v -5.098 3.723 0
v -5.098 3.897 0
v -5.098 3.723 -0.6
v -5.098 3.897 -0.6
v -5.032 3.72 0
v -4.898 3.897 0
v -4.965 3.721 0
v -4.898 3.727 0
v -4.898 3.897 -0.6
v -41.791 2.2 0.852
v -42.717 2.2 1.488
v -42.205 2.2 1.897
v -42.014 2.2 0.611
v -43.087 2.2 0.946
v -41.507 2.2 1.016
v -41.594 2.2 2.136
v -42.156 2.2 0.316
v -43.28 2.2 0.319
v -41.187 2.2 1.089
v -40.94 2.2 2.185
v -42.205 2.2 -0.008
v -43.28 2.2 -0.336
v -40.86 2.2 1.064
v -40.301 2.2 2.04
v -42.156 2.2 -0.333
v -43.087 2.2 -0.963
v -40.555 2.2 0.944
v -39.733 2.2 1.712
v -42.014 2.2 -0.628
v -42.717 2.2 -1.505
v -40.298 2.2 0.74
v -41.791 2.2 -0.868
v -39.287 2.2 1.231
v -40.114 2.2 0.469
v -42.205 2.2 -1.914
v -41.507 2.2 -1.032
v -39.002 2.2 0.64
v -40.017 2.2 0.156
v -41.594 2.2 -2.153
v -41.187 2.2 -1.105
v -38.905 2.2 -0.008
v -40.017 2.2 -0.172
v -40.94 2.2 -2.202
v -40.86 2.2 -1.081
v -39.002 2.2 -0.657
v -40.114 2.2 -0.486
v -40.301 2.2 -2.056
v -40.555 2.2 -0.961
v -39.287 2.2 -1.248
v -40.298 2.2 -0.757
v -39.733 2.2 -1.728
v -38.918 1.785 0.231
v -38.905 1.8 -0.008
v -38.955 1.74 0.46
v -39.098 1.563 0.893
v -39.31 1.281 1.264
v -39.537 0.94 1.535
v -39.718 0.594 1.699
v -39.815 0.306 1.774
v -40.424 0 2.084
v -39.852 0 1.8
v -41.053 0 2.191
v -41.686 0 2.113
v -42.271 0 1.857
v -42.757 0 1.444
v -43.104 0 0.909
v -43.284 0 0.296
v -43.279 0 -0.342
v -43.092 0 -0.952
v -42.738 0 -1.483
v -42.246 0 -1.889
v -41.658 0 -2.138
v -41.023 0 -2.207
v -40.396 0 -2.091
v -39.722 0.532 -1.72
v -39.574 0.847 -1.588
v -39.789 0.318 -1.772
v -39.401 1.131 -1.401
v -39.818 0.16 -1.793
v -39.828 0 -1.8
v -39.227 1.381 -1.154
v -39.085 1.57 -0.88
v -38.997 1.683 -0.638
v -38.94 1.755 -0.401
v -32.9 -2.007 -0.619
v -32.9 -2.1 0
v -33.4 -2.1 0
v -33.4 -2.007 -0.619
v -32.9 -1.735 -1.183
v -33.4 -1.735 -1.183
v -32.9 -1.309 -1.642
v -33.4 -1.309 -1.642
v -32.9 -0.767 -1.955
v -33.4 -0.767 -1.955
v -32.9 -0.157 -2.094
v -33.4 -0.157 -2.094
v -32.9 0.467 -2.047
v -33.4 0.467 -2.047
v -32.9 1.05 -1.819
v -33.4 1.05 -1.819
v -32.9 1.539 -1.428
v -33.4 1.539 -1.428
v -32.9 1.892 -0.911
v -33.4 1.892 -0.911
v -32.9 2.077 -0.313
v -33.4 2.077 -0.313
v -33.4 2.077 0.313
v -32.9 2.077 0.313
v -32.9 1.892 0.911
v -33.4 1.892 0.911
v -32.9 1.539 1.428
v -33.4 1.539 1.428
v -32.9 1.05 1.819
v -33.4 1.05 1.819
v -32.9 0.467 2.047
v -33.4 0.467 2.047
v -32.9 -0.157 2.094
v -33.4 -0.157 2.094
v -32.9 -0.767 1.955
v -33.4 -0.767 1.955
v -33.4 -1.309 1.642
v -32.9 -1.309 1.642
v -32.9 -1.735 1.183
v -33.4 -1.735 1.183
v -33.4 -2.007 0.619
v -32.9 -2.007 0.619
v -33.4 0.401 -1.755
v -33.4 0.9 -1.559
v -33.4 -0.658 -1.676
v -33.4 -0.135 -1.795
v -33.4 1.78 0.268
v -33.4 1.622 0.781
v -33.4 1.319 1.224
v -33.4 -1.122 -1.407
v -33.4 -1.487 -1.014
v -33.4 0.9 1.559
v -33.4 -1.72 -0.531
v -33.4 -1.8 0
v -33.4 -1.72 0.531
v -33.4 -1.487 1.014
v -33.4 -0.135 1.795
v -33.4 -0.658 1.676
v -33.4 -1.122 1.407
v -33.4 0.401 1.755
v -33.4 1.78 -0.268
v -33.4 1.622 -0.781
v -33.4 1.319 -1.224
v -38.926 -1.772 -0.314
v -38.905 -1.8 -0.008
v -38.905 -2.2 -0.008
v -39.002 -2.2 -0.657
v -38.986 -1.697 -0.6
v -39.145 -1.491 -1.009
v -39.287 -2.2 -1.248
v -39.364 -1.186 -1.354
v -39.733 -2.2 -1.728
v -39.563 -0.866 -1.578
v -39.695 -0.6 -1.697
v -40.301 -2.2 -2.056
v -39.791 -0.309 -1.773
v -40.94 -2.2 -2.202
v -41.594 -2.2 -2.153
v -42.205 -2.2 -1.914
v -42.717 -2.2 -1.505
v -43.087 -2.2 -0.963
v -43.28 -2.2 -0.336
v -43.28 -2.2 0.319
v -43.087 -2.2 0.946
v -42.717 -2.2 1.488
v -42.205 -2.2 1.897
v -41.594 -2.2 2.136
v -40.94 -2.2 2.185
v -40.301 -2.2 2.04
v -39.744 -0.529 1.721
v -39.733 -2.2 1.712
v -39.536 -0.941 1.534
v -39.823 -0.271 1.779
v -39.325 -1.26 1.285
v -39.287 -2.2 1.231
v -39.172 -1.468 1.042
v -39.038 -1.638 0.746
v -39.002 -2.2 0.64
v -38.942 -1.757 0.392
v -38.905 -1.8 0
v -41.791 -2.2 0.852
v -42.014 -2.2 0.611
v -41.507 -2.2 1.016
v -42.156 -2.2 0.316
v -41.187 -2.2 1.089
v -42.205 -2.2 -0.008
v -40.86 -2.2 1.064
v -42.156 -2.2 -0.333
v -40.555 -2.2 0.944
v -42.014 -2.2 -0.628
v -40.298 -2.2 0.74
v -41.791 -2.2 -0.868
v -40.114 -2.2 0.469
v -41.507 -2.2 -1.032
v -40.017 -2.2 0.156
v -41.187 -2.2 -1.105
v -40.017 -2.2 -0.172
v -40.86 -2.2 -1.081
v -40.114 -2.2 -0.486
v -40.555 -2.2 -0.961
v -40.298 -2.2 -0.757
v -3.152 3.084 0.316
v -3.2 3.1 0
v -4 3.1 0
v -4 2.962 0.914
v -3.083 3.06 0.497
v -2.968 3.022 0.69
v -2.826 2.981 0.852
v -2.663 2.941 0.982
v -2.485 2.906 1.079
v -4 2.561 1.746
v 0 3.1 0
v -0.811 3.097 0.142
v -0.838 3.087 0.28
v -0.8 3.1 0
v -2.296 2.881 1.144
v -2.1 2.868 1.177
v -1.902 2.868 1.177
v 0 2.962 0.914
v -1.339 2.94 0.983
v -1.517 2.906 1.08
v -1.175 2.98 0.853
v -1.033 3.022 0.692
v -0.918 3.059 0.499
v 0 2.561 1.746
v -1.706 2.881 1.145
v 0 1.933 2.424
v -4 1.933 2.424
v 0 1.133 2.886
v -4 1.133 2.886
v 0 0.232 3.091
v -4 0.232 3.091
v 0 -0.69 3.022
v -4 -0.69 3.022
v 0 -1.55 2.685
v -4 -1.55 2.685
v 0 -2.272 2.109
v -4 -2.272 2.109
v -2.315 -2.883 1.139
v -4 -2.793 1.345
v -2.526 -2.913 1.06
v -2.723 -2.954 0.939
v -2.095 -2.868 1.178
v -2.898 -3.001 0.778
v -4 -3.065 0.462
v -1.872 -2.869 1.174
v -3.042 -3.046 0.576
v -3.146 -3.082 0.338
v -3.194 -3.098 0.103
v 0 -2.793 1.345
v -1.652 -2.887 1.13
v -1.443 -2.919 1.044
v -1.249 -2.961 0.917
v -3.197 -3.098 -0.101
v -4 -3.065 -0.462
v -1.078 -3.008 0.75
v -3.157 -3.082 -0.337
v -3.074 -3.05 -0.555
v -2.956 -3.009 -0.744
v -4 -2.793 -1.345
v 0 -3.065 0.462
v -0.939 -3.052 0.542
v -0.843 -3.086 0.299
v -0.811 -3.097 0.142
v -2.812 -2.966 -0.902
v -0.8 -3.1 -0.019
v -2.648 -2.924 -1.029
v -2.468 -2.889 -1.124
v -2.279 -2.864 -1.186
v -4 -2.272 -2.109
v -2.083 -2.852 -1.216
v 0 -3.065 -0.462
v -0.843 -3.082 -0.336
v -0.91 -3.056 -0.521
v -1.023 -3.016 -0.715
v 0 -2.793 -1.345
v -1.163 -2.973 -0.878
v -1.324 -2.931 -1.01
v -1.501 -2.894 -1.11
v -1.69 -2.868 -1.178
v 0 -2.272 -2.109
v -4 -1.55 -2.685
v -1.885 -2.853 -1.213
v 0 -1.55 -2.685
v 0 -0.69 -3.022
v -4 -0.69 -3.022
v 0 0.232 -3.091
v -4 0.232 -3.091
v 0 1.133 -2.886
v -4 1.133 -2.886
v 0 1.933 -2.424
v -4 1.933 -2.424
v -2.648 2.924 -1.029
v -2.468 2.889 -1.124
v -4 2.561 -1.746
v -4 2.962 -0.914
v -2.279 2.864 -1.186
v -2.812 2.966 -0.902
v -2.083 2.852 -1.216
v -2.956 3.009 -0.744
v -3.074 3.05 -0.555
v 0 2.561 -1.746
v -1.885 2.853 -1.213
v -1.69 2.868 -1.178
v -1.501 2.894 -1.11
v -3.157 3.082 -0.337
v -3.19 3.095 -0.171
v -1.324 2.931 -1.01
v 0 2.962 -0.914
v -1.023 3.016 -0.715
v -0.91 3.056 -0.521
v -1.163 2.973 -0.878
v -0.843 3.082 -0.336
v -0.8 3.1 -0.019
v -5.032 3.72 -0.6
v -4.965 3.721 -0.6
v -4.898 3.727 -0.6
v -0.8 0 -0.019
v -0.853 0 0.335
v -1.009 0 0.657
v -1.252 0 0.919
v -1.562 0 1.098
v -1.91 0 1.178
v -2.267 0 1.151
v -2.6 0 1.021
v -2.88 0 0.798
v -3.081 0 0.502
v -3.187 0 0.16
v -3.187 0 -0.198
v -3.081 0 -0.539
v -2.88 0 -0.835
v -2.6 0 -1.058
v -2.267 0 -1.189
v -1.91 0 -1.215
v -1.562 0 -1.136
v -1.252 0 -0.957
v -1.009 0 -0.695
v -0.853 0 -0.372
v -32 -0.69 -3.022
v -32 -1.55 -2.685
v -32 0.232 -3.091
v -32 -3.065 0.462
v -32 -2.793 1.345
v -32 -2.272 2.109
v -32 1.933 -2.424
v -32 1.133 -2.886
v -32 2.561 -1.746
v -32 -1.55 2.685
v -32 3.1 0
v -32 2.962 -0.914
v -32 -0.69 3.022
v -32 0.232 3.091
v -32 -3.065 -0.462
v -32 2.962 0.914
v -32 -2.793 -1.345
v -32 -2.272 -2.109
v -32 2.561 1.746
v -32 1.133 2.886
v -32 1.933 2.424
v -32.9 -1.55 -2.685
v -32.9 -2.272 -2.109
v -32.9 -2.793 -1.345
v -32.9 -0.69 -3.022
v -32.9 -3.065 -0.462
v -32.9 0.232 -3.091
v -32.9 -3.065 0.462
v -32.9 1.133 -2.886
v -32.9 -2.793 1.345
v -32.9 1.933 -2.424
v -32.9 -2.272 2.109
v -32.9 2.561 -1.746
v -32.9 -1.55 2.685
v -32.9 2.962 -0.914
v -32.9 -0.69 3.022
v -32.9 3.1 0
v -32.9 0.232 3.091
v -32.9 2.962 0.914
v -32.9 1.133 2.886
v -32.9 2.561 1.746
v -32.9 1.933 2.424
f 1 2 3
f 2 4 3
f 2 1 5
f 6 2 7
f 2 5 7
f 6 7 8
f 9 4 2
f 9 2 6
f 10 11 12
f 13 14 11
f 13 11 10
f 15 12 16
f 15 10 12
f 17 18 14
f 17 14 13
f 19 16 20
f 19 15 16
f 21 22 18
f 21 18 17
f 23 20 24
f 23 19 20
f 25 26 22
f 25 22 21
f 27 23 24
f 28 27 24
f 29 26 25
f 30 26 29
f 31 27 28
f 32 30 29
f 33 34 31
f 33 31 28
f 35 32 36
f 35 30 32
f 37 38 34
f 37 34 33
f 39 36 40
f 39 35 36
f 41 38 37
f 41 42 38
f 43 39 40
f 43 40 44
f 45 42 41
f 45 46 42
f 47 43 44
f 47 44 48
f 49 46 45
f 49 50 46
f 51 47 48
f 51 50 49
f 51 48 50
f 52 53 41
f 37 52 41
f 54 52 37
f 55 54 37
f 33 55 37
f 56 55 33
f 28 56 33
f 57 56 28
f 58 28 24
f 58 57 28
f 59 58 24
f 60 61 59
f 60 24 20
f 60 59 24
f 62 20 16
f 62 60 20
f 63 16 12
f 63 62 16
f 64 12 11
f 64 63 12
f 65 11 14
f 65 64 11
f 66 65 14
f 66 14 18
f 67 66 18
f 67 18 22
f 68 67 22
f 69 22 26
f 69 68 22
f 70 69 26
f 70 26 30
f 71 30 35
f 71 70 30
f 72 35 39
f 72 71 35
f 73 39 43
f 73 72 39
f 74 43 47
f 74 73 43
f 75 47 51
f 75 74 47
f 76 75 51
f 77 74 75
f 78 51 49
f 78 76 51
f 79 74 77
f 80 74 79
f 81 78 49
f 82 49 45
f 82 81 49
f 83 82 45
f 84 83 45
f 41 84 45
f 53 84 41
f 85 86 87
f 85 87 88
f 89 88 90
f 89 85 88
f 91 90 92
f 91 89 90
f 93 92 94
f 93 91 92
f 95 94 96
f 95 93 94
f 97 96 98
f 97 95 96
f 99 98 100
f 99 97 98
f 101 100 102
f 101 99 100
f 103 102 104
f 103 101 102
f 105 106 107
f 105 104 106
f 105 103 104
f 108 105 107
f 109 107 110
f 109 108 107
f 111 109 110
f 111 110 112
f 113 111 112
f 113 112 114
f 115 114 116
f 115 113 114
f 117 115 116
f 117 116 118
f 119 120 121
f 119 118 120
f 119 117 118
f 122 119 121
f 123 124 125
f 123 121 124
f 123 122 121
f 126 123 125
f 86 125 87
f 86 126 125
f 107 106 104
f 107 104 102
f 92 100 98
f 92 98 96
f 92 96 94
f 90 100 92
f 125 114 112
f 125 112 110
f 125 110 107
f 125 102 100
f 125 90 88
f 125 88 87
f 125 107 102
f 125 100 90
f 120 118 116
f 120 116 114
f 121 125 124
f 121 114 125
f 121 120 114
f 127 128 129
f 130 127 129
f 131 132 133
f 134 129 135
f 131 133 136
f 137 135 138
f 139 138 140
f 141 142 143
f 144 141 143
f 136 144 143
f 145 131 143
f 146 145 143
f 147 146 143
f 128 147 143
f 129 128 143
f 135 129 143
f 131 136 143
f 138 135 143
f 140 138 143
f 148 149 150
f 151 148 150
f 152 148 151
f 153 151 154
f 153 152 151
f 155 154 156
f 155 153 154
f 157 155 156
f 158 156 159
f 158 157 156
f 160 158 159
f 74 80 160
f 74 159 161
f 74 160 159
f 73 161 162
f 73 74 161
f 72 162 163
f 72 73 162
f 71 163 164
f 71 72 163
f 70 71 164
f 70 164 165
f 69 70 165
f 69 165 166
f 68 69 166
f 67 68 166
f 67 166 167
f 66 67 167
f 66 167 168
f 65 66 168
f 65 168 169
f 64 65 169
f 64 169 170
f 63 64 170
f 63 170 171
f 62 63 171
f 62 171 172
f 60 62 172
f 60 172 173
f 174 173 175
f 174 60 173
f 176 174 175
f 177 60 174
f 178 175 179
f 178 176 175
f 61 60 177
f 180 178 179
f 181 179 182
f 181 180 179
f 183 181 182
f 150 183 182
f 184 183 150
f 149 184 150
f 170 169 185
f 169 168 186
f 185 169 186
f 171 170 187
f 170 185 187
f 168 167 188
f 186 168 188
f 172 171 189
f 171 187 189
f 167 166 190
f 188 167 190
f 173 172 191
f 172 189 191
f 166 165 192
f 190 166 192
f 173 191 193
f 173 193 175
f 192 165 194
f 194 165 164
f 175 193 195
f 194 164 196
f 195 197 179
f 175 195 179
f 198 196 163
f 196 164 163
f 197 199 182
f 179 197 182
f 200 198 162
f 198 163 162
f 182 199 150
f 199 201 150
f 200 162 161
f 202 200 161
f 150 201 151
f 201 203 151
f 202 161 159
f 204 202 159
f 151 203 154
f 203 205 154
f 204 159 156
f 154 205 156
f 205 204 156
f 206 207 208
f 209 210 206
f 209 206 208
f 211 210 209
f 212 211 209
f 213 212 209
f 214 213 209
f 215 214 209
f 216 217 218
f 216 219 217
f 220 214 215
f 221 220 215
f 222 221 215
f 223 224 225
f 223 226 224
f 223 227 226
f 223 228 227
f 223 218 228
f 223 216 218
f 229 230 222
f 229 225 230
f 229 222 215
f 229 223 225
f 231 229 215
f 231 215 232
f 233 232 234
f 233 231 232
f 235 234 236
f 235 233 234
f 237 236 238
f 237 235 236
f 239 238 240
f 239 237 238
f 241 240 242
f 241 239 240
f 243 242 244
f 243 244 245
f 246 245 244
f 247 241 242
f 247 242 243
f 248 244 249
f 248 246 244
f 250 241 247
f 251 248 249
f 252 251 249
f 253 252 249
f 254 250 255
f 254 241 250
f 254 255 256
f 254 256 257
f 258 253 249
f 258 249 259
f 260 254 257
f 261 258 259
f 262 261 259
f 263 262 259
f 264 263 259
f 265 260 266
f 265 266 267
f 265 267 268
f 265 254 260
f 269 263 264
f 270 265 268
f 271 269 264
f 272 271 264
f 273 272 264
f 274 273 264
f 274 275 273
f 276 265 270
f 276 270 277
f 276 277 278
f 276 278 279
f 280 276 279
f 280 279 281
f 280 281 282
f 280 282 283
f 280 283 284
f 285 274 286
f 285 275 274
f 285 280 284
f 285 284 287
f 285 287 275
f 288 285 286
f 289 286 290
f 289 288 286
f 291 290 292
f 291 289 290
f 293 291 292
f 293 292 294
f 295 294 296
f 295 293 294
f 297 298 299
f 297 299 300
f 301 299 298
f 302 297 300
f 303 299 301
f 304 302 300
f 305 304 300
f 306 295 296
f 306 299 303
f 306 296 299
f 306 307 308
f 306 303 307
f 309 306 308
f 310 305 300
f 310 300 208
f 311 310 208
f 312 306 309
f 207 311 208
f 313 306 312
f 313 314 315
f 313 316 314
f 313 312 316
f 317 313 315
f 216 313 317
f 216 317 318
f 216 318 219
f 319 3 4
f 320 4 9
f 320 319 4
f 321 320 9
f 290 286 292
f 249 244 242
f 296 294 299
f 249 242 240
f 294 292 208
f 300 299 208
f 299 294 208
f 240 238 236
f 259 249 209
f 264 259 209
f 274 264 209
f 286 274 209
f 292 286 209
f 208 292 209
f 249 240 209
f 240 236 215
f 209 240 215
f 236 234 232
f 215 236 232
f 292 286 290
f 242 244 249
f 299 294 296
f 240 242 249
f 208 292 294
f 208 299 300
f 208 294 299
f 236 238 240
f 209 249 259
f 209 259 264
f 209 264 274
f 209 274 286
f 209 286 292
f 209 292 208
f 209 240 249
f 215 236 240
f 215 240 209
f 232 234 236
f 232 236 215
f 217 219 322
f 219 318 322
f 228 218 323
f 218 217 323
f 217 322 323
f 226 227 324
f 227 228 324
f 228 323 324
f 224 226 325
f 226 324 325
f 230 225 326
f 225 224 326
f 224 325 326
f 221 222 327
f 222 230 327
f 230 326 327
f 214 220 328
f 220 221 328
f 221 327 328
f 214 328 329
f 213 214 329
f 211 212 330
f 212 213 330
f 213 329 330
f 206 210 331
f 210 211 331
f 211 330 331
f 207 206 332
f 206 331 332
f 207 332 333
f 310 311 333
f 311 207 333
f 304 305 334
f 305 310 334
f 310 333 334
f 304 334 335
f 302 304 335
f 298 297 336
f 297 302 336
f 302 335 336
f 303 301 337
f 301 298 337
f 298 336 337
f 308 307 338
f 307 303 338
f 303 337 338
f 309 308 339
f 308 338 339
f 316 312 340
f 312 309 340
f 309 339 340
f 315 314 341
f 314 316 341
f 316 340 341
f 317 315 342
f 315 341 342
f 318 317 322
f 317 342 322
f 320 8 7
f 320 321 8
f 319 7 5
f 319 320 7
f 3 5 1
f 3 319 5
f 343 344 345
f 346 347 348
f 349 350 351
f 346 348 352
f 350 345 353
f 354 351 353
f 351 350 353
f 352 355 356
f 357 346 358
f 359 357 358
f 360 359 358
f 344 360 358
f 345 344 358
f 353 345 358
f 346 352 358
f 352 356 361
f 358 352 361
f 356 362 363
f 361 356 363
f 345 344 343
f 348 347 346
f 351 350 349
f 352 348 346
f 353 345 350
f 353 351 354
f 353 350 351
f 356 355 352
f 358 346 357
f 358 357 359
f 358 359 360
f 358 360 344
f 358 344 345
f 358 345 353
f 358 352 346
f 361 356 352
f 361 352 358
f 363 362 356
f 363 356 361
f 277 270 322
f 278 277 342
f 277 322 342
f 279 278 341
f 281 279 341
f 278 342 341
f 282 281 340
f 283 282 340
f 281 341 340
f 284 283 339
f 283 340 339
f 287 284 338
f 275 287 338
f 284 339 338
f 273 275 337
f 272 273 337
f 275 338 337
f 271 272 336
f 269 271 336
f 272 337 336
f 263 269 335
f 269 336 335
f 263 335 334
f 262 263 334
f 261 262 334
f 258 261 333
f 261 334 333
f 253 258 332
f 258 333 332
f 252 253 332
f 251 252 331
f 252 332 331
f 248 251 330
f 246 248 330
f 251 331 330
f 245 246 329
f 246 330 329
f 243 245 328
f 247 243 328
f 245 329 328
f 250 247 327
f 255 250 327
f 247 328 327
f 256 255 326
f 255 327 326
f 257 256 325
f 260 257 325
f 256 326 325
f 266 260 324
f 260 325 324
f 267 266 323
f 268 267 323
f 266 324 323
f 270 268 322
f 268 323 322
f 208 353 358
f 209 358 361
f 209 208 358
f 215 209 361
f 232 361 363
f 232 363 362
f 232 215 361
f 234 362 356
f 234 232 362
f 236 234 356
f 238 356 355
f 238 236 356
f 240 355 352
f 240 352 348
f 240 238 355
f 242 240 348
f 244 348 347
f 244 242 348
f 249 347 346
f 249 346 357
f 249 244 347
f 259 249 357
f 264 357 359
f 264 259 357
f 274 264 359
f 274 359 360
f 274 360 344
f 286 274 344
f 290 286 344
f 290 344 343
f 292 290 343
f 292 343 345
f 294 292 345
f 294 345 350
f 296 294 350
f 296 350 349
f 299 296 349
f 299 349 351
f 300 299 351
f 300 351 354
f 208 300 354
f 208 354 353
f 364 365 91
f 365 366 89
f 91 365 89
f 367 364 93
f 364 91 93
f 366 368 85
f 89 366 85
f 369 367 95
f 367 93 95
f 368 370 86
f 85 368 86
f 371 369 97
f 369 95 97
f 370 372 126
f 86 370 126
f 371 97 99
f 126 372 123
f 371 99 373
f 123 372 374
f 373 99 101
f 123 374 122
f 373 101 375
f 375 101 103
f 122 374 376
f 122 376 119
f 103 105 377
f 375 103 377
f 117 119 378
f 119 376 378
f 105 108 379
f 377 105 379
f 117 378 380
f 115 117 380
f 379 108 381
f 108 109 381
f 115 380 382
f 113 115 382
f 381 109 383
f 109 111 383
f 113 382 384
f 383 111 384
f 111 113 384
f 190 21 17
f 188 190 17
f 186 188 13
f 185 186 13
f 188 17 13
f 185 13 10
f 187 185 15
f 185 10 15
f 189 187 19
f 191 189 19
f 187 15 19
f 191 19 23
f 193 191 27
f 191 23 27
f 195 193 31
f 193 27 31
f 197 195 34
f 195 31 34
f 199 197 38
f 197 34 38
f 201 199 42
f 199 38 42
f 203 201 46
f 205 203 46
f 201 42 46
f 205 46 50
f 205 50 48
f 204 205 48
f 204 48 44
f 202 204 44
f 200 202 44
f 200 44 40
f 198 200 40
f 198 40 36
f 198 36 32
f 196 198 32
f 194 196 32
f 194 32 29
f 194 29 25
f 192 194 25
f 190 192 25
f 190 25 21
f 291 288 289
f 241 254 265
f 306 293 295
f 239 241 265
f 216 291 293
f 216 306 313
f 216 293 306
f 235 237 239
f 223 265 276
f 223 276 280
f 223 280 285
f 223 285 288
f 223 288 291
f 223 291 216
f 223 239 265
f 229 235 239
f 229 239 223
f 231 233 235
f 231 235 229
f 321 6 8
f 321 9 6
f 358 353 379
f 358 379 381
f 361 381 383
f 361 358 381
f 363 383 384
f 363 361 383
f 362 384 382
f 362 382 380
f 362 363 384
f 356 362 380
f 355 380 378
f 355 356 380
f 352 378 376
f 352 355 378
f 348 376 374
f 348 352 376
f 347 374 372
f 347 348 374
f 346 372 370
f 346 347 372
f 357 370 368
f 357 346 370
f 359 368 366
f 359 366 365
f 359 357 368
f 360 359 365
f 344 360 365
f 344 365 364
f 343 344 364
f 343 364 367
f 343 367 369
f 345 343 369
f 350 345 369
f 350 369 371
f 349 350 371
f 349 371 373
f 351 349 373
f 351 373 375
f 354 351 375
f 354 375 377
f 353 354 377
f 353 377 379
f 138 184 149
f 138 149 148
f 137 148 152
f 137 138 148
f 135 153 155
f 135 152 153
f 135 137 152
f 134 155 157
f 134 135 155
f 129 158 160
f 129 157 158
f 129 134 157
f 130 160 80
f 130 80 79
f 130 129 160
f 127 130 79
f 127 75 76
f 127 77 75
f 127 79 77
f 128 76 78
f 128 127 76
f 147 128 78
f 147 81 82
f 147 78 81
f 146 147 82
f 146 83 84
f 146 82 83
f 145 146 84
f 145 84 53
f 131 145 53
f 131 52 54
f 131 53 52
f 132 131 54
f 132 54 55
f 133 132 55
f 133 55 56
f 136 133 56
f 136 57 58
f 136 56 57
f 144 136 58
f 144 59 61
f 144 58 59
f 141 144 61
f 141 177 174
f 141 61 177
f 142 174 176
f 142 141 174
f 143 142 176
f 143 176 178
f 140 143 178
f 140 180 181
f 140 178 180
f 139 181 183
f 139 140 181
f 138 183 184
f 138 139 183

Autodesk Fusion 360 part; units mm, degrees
sketch "Sketch1" plane through (0, 0, 0) normal (1, 0, 0) x (0, 1, 0)
  circle A0 centre (0, 0) radius 3.1
  dimension "d1" = 6.2
extrude "Extrude1" add sketch "Sketch1" against normal blind 4 makes body 1
extrude "Extrude1'" add 1 faces at (-4, -0.4599, 1.4057) along direction (-1, 0, 0) blind 28 separate body on bodies 1 makes body 2 in component "Component"
extrude "Extrude1''" add 1 faces at (-32, -0.4599, 1.4057) along direction (-1, 0, 0) blind 0.9 separate body on bodies 2 makes body 3 in component "Component'"
sketch "Sketch2" plane through (-32.9, 0, 0) normal (-1, 0, 0) x (0, -1, 0)
  circle A0 centre (0, 0) radius 3.1
  circle A1 centre (0, 0) radius 2.1
  dimension "d8" = 4.2
extrude "Extrude2" add sketch "Sketch2" along normal blind 0.5 contours A1 bodies 3 in component "Component'"
sketch "Sketch3" plane through (-33.4, 0, 0) normal (-1, 0, 0) x (0, -1, 0)
  circle A0 centre (0, 0) radius 2.1
  circle A1 centre (0, 0) radius 1.8
  dimension "d11" = 3.6
extrude "Extrude2'" add sketch "Sketch3" along normal blind 7.7 separate body contours A1 makes body 4
sketch "Sketch4" plane through (0, 0, 0) normal (0, 1, 0) x (1, 0, 0)
  circle A0 centre (-41.1047, 0.0084) radius 2.2
  dimension "d14" = 4.4
extrude "Extrude3" add sketch "Sketch4" along normal mid plane 4.4 bodies 4
sketch "Sketch5" plane through (0, 2.2, 0) normal (0, 1, 0) x (-1, 0, 0)
  circle A0 centre (41.1047, -0.0084) radius 2.2
  circle A1 centre (41.1047, -0.0084) radius 1.1
  dimension "d17" = 2.2
extrude "Extrude4" cut sketch "Sketch5" against normal blind 5.607 contours A1 bodies 4
sketch "Sketch6" plane through (0, 0, 0) normal (0, 1, 0) x (1, 0, 0)
  circle A0 centre (-2, 0.0187) radius 1.2
  line L0 (0, -3.1) -> (0, 3.1)
  dimension "d20" = 2.4
  dimension "d21" = 2.4
  dimension "d22" = 2
extrude "Extrude5" cut sketch "Sketch6" along normal mid plane 13.01 bodies 1
sketch "Sketch7" plane through (0, 0, 0) normal (1, 0, 0) x (0, 1, 0)
sketch "Sketch8" plane through (0, 0, 0) normal (0, 0, 1) x (1, 0, 0)
  circle A0 centre (-5.0226, 4.9201) radius 1
  dimension "d25" = 2
sketch "Sketch9" plane through (0, 0, 0) normal (0, 0, -1) x (1, 0, 0)
  circle A0 centre (-5.0226, -4.9201) radius 1
  circle A1 centre (-5.0226, -4.9201) radius 0.8
  dimension "d28" = 1.6
sketch "Sketch10" plane through (0, 0, -0.6) normal (0, 0, -1) x (1, 0, 0)
  circle A0 centre (-5.0226, -4.9201) radius 0.8
  circle A1 centre (-5.0226, -4.9201) radius 0.6
  dimension "d31" = 1.2
sketch "Sketch11" plane through (0, 0, 0) normal (0, 0, -1) x (1, 0, 0)
  circle A0 centre (-5.0226, -4.9201) radius 0.8
  circle A1 centre (-5.0226, -4.9201) radius 1
  circle A2 centre (-5.0226, -4.9201) radius 1.2
  dimension "d34" = 2.4
sketch "Sketch12" plane through (0, 0, -0.6) normal (0, 0, -1) x (1, 0, 0)
  circle A0 centre (-5.0226, -4.9201) radius 1.2
  line L0 (-5.0985, -4.0295) -> (-5.0985, -3.6215)
  line L1 (-4.8985, -4.028) -> (-4.8985, -3.6403)
  line L2 (-4.9985, -4.9971) -> (-4.9985, -3.4779) construction
  line L3 (-5.1941, -3.8971) -> (-4.7341, -3.8971)
  circle A1 centre (-5.0226, -4.9201) radius 0.8
  dimension "d37" = 0.1
  dimension "d38" = 0.1
  dimension "d41" = 1.1
extrude "Extrude10" add sketch "Sketch12" against normal blind 0.6 separate body contours A0 L0 L1 L3 picked at (-4.9874, -3.8385) makes body 5
sketch "Sketch13" plane through (0, 0, -0.6) normal (0, 0, -1) x (1, 0, 0)
  line L0 (-4.8985, -3.8971) -> (-4.8985, -3.7265)
  arc A0 (-4.8985, -3.7265) -> (-5.0985, -3.7225) centre (-5.0226, -4.9201) ccw
  line L1 (-5.0985, -3.7225) -> (-5.0985, -3.8971)
  line L2 (-5.0985, -3.8971) -> (-4.8985, -3.8971)
  line L3 (-5.0226, -4.9201) -> (-4.9575, -5.4988)
  arc A1 (-5.3142, -3.7561) -> (-5.5035, -3.8207) centre (-5.0226, -4.9201) ccw
  line L4 (-5.2559, -3.9163) -> (-5.3142, -3.7561)
  line L5 (-5.4438, -3.9847) -> (-5.2559, -3.9163)
  line L6 (-5.5035, -3.8207) -> (-5.4438, -3.9847)
  arc A2 (-5.6948, -3.926) -> (-5.8506, -4.0515) centre (-5.0226, -4.9201) ccw
  line L7 (-5.5851, -4.0567) -> (-5.6948, -3.926)
  line L8 (-5.7383, -4.1852) -> (-5.5851, -4.0567)
  line L9 (-5.8506, -4.0515) -> (-5.7383, -4.1852)
  arc A3 (-5.9942, -4.2158) -> (-6.0977, -4.387) centre (-5.0226, -4.9201) ccw
  line L10 (-5.8465, -4.3011) -> (-5.9942, -4.2158)
  line L11 (-5.9465, -4.4743) -> (-5.8465, -4.3011)
  line L12 (-6.0977, -4.387) -> (-5.9465, -4.4743)
  arc A4 (-6.1765, -4.5906) -> (-6.2152, -4.7869) centre (-5.0226, -4.9201) ccw
  line L13 (-6.0085, -4.6202) -> (-6.1765, -4.5906)
  line L14 (-6.0433, -4.8172) -> (-6.0085, -4.6202)
  line L15 (-6.2152, -4.7869) -> (-6.0433, -4.8172)
  arc A5 (-6.2196, -5.0051) -> (-6.1888, -5.2028) centre (-5.0226, -4.9201) ccw
  line L16 (-6.0516, -4.9755) -> (-6.2196, -5.0051)
  line L17 (-6.0169, -5.1725) -> (-6.0516, -4.9755)
  line L18 (-6.1888, -5.2028) -> (-6.0169, -5.1725)
  arc A6 (-6.1183, -5.4094) -> (-6.0218, -5.5846) centre (-5.0226, -4.9201) ccw
  line L19 (-5.9706, -5.3241) -> (-6.1183, -5.4094)
  line L20 (-5.8706, -5.4973) -> (-5.9706, -5.3241)
  line L21 (-6.0218, -5.5846) -> (-5.8706, -5.4973)
  arc A7 (-5.8849, -5.7546) -> (-5.7343, -5.8863) centre (-5.0226, -4.9201) ccw
  line L22 (-5.7752, -5.624) -> (-5.8849, -5.7546)
  line L23 (-5.622, -5.7525) -> (-5.7752, -5.624)
  line L24 (-5.7343, -5.8863) -> (-5.622, -5.7525)
  arc A8 (-5.5474, -5.9992) -> (-5.3609, -6.0714) centre (-5.0226, -4.9201) ccw
  line L25 (-5.4891, -5.839) -> (-5.5474, -5.9992)
  line L26 (-5.3012, -5.9074) -> (-5.4891, -5.839)
  line L27 (-5.3609, -6.0714) -> (-5.3012, -5.9074)
  arc A9 (-5.1467, -6.1137) -> (-4.9467, -6.1177) centre (-5.0226, -4.9201) ccw
  line L28 (-5.1467, -5.9431) -> (-5.1467, -6.1137)
  line L29 (-4.9467, -5.9431) -> (-5.1467, -5.9431)
  line L30 (-4.9467, -6.1177) -> (-4.9467, -5.9431)
  arc A10 (-4.731, -6.0841) -> (-4.5417, -6.0195) centre (-5.0226, -4.9201) ccw
  line L31 (-4.7893, -5.9238) -> (-4.731, -6.0841)
  line L32 (-4.6014, -5.8554) -> (-4.7893, -5.9238)
  line L33 (-4.5417, -6.0195) -> (-4.6014, -5.8554)
  arc A11 (-4.3505, -5.9142) -> (-4.1947, -5.7887) centre (-5.0226, -4.9201) ccw
  line L34 (-4.4601, -5.7835) -> (-4.3505, -5.9142)
  line L35 (-4.3069, -5.655) -> (-4.4601, -5.7835)
  line L36 (-4.1947, -5.7887) -> (-4.3069, -5.655)
  arc A12 (-4.051, -5.6243) -> (-3.9475, -5.4532) centre (-5.0226, -4.9201) ccw
  line L37 (-4.1987, -5.5391) -> (-4.051, -5.6243)
  line L38 (-4.0987, -5.3659) -> (-4.1987, -5.5391)
  line L39 (-3.9475, -5.4532) -> (-4.0987, -5.3659)
  arc A13 (-3.8687, -5.2496) -> (-3.83, -5.0533) centre (-5.0226, -4.9201) ccw
  line L40 (-4.0367, -5.2199) -> (-3.8687, -5.2496)
  line L41 (-4.002, -5.023) -> (-4.0367, -5.2199)
  line L42 (-3.83, -5.0533) -> (-4.002, -5.023)
  arc A14 (-3.8256, -4.835) -> (-3.8564, -4.6374) centre (-5.0226, -4.9201) ccw
  line L43 (-3.9936, -4.8647) -> (-3.8256, -4.835)
  line L44 (-4.0283, -4.6677) -> (-3.9936, -4.8647)
  line L45 (-3.8564, -4.6374) -> (-4.0283, -4.6677)
  arc A15 (-3.9269, -4.4308) -> (-4.0234, -4.2556) centre (-5.0226, -4.9201) ccw
  line L46 (-4.0746, -4.5161) -> (-3.9269, -4.4308)
  line L47 (-4.1746, -4.3429) -> (-4.0746, -4.5161)
  line L48 (-4.0234, -4.2556) -> (-4.1746, -4.3429)
  arc A16 (-4.1603, -4.0855) -> (-4.311, -3.9539) centre (-5.0226, -4.9201) ccw
  line L49 (-4.27, -4.2162) -> (-4.1603, -4.0855)
  line L50 (-4.4232, -4.0876) -> (-4.27, -4.2162)
  line L51 (-4.311, -3.9539) -> (-4.4232, -4.0876)
  arc A17 (-4.4978, -3.841) -> (-4.6843, -3.7688) centre (-5.0226, -4.9201) ccw
  line L52 (-4.5561, -4.0012) -> (-4.4978, -3.841)
  line L53 (-4.744, -3.9328) -> (-4.5561, -4.0012)
  line L54 (-4.6843, -3.7688) -> (-4.744, -3.9328)
  dimension "d45" = 360
sketch "Sketch14" plane through (0, 0, 0) normal (1, 0, 0) x (0, 1, 0)
  circle A0 centre (0, 0) radius 3.1
sketch "Sketch15" plane through (0, 0, 0) normal (1, 0, 0) x (0, 1, 0)
ref_plane "WorkPlane1" through (-6.4, 0, 0) normal (1, 0, 0) x (0, 1, 0)
sketch "Sketch16" plane through (-6.4, 0, 0) normal (1, 0, 0) x (0, 1, 0)
sketch "Sketch17" plane through (0, 0, 0) normal (1, 0, 0) x (0, 1, 0)
  line L0 (0, 0) -> (0, 3.0141) construction
sketch "Sketch18" plane through (0, 0, 0) normal (0, 0, 1) x (1, 0, 0)
component "Component" placed x (1, 0, 0) y (0, 1, 0) z (0, 0, 1) at (0, 0, 0)
component "Component'" placed x (1, 0, 0) y (0, 1, 0) z (0, 0, 1) at (0, 0, 0)
